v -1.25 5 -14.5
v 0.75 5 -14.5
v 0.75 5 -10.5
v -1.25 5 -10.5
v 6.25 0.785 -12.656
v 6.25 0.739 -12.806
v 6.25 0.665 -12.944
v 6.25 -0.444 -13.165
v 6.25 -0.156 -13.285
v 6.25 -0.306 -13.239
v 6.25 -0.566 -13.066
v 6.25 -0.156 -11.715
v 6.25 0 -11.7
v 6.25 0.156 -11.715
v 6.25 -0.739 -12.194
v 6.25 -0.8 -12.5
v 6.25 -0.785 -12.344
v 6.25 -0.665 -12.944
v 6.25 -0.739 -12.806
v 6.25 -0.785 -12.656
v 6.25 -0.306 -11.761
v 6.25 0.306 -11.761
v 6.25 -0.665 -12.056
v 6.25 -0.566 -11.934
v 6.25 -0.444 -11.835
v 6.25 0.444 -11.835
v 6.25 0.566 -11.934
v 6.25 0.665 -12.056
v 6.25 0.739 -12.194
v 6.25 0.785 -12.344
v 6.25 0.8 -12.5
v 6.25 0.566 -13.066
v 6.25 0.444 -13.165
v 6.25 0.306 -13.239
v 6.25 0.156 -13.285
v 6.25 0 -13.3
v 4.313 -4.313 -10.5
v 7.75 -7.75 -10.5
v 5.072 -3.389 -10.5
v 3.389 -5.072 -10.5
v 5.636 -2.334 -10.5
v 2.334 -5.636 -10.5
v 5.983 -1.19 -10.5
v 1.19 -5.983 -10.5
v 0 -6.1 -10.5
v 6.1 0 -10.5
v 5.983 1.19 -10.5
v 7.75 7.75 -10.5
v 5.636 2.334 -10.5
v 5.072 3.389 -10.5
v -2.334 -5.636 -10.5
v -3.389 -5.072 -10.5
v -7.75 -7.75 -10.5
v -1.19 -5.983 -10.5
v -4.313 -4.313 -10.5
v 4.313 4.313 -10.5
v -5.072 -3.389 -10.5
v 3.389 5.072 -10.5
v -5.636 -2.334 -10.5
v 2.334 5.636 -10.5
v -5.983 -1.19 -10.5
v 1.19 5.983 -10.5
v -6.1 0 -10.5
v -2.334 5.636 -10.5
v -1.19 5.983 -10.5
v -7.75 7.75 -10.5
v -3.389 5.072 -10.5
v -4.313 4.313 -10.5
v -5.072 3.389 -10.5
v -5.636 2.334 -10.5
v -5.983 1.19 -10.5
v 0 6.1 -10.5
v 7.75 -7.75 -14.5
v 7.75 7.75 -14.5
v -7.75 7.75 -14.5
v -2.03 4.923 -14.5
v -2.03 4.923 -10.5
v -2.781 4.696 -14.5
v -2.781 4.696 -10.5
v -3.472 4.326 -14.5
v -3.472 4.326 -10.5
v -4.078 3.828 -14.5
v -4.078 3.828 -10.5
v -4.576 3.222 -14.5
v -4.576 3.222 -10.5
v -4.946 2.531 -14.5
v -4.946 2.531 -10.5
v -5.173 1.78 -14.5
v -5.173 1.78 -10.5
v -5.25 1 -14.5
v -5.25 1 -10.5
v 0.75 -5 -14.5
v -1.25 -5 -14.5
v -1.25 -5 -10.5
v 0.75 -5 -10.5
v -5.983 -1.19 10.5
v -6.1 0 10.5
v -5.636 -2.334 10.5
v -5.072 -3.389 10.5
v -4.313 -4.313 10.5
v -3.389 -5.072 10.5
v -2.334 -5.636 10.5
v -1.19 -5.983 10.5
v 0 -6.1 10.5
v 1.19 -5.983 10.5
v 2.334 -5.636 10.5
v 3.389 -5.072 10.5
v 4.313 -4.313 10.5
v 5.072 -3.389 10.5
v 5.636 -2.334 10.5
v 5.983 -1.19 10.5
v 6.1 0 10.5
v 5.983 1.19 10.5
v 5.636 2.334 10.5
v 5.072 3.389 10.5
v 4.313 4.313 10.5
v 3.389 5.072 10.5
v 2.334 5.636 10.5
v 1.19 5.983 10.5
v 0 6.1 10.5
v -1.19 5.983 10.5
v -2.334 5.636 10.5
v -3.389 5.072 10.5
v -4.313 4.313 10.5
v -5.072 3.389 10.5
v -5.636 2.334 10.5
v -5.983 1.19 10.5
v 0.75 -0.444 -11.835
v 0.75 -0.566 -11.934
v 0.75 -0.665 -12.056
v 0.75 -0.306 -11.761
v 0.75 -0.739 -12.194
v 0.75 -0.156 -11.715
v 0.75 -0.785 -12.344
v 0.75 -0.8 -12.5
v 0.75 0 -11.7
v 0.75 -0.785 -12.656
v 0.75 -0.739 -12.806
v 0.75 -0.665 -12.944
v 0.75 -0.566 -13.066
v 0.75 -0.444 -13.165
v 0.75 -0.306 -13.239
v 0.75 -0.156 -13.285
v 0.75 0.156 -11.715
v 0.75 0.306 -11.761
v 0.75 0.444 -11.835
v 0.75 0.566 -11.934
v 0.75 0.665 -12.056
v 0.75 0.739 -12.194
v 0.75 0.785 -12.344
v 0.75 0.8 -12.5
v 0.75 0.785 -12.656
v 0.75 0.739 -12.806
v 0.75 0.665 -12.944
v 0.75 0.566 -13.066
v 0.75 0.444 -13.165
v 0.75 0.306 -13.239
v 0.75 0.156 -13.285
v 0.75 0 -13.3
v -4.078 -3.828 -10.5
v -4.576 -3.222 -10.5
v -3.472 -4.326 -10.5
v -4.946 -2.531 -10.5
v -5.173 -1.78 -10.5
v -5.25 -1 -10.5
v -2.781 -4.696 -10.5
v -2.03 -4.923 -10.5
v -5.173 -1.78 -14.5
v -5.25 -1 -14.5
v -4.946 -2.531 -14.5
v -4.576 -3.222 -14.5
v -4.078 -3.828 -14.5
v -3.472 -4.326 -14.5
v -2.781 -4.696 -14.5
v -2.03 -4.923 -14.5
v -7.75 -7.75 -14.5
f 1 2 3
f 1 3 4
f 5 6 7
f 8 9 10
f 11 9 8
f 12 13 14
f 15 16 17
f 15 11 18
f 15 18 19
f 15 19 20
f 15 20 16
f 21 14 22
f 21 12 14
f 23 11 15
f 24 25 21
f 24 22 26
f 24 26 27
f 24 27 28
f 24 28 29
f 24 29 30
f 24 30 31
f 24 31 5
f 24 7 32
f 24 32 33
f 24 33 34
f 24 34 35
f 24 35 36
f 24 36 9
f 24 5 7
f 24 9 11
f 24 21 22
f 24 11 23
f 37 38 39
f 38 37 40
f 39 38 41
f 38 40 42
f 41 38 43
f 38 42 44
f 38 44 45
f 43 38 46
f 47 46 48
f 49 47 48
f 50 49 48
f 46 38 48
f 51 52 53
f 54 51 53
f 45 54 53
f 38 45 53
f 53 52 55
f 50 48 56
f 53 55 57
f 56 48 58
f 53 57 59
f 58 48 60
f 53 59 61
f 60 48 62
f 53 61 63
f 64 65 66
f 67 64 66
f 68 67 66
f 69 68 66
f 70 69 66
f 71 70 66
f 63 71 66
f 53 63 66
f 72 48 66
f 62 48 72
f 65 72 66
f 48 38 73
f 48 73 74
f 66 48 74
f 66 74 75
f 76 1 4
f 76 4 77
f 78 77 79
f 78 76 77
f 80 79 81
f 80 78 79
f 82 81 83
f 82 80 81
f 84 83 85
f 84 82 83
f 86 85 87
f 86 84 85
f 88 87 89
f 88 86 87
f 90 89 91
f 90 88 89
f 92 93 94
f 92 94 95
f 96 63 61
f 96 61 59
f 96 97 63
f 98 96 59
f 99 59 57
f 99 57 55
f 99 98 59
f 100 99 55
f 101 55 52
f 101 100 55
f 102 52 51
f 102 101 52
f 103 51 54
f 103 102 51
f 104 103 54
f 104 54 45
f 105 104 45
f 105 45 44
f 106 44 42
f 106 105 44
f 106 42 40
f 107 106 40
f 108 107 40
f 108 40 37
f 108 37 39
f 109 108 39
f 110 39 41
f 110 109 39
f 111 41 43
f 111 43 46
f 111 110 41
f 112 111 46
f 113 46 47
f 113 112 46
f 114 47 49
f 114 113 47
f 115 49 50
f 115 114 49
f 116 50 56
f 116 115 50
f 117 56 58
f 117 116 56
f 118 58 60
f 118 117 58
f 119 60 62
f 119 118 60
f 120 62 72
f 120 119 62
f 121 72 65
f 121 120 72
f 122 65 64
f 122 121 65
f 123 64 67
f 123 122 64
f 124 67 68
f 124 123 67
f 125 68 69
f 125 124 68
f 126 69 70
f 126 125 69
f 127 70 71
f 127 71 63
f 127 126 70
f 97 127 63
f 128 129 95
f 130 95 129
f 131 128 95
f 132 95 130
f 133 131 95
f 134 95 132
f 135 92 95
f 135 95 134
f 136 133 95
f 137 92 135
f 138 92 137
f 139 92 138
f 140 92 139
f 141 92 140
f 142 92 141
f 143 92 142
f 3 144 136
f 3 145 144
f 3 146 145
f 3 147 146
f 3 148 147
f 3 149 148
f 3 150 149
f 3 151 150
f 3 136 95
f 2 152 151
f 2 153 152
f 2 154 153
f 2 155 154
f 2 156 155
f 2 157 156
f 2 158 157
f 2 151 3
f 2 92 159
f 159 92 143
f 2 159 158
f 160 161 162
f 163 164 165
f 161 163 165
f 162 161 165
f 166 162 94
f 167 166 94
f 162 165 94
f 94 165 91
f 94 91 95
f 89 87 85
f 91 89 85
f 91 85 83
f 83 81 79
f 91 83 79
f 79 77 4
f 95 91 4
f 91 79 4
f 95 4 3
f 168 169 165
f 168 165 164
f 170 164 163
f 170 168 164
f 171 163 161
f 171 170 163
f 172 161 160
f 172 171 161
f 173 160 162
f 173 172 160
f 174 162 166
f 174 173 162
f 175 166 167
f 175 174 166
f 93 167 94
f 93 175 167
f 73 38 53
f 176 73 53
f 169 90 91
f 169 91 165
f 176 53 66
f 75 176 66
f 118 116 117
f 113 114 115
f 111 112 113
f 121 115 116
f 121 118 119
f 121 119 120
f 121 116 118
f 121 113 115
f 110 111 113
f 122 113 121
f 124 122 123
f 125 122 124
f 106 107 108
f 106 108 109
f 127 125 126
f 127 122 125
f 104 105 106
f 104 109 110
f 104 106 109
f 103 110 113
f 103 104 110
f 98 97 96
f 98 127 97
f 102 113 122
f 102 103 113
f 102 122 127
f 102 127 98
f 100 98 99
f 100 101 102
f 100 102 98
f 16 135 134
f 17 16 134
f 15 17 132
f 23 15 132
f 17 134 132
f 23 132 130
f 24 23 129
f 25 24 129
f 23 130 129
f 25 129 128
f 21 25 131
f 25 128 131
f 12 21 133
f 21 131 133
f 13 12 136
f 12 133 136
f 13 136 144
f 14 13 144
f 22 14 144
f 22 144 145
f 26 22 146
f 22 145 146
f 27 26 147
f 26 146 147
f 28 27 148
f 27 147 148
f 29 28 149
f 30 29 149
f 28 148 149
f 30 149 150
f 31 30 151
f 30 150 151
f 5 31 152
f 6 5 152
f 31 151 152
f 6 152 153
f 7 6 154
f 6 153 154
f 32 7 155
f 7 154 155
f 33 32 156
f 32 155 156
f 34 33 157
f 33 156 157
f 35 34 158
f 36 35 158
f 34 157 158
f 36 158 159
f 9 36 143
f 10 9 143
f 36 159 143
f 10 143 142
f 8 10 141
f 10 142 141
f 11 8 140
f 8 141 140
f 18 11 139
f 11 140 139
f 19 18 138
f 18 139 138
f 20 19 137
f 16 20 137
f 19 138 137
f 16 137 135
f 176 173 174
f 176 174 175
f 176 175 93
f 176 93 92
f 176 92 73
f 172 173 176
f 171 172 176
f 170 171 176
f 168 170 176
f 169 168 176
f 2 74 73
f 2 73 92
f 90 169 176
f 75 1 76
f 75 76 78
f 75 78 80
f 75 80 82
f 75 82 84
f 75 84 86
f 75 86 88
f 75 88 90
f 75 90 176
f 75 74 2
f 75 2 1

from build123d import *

# Parameters (mm, degrees)
SKETCH1_R           = 6.1
BOSS_EXTRUDE1_DEPTH = 10.5
SKETCH2_W           = 15.5
SKETCH2_H           = 15.5
BOSS_EXTRUDE2_DEPTH = 4
CUT_EXTRUDE1_DEPTH  = 4
SKETCH4_R           = 0.8
CUT_EXTRUDE2_DEPTH  = 5.5


with BuildPart() as part:
    # Sketch1 → Boss-Extrude1 (new, symmetric)
    with BuildSketch(Plane.XY):
        with Locations(Location((0, 0, 0), (0, 0, 180))):
            Circle(SKETCH1_R)
    extrude(amount=BOSS_EXTRUDE1_DEPTH, both=True)

    # Sketch2 → Boss-Extrude2 (add)
    with BuildSketch(Plane(origin=(0, 0, -10.5), x_dir=(-1, 0, 0), z_dir=(0, 0, -1))):
        Rectangle(SKETCH2_W, SKETCH2_H)
    extrude(amount=BOSS_EXTRUDE2_DEPTH)

    # Sketch3 → Cut-Extrude1 (cut)
    with BuildSketch(Plane(origin=(0, 0, -14.5), x_dir=(-1, 0, 0), z_dir=(0, 0, -1))):
        with BuildLine():
            Line((-0.75, 5), (1.25, 5))
            ThreePointArc((1.25, 5), (4.078427125, 3.828427125), (5.25, 1))
            Line((5.25, 1), (5.25, -1))
            ThreePointArc((5.25, -1), (4.078427125, -3.828427125), (1.25, -5))
            Line((1.25, -5), (-0.75, -5))
            Line((-0.75, -5), (-0.75, 5))
        make_face()
    extrude(amount=-CUT_EXTRUDE1_DEPTH, mode=Mode.SUBTRACT)

    # Sketch4 → Cut-Extrude2 (cut)
    with BuildSketch(Plane.ZY.offset(-0.75)):
        with Locations(Location((-12.5, 0, 0), (0, 0, 270))):
            Circle(SKETCH4_R)
    extrude(amount=-CUT_EXTRUDE2_DEPTH, mode=Mode.SUBTRACT)


solid = part.part
